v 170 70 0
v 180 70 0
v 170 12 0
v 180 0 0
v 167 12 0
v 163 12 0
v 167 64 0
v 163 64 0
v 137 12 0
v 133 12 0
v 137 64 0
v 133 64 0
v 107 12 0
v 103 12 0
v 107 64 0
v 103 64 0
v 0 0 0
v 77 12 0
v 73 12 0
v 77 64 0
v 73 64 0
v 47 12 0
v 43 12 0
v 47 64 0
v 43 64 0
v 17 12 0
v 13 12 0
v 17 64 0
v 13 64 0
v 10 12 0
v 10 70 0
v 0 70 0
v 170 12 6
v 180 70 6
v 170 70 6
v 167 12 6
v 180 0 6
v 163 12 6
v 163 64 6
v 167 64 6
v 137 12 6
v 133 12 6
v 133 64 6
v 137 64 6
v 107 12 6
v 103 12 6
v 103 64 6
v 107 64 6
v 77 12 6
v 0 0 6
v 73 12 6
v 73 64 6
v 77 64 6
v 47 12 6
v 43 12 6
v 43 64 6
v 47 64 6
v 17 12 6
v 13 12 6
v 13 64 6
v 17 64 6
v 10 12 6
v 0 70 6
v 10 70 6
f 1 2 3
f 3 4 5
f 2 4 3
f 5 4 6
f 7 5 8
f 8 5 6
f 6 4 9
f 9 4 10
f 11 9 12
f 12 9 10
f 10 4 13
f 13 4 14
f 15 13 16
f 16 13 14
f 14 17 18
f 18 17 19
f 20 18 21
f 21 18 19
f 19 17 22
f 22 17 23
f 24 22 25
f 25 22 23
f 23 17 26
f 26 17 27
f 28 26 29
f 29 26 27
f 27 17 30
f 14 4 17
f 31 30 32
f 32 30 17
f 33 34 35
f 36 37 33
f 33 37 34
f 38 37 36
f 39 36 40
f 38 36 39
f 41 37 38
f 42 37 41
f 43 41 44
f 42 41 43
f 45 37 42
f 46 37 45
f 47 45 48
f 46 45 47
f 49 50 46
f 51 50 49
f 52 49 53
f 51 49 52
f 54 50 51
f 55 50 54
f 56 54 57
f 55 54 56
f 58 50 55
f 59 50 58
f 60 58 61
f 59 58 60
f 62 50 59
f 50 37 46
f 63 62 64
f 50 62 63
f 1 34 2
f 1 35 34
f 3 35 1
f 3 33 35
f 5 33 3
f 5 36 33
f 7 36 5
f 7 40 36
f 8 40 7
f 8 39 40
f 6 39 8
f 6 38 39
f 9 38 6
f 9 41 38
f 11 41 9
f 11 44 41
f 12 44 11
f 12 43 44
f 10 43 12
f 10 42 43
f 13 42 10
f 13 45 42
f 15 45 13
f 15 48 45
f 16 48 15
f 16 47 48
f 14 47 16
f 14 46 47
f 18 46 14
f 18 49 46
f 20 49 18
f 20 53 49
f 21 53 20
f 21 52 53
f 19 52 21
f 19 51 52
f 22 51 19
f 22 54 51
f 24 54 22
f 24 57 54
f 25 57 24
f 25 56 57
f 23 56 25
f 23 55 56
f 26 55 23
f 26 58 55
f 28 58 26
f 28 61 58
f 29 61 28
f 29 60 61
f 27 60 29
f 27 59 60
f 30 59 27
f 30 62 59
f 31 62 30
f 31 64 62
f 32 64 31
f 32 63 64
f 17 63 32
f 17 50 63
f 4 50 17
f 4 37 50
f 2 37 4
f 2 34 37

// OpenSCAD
$fn = 32;

// ----------------------------------------------------------------------
// Guard grille: 6 slats over a 180 x 70 mm plate
// ----------------------------------------------------------------------

// --- parameters (mm) ---
profile_height = 6;       // extrusion height
profile_points = 32;      // points of the closed outline

profile = [[0, 0], [180, 0], [180, 70], [170, 70], [170, 12], [167, 12], [167, 64], [163, 64], [163, 12], [137, 12], [137, 64], [133, 64], [133, 12], [107, 12], [107, 64], [103, 64], [103, 12], [77, 12], [77, 64], [73, 64], [73, 12], [47, 12], [47, 64], [43, 64], [43, 12], [17, 12], [17, 64], [13, 64], [13, 12], [10, 12], [10, 70], [0, 70]];  // single closed polygon, 32 points, counter clockwise

// --- the one profile operation ---
linear_extrude(height = profile_height) polygon(points = profile);
